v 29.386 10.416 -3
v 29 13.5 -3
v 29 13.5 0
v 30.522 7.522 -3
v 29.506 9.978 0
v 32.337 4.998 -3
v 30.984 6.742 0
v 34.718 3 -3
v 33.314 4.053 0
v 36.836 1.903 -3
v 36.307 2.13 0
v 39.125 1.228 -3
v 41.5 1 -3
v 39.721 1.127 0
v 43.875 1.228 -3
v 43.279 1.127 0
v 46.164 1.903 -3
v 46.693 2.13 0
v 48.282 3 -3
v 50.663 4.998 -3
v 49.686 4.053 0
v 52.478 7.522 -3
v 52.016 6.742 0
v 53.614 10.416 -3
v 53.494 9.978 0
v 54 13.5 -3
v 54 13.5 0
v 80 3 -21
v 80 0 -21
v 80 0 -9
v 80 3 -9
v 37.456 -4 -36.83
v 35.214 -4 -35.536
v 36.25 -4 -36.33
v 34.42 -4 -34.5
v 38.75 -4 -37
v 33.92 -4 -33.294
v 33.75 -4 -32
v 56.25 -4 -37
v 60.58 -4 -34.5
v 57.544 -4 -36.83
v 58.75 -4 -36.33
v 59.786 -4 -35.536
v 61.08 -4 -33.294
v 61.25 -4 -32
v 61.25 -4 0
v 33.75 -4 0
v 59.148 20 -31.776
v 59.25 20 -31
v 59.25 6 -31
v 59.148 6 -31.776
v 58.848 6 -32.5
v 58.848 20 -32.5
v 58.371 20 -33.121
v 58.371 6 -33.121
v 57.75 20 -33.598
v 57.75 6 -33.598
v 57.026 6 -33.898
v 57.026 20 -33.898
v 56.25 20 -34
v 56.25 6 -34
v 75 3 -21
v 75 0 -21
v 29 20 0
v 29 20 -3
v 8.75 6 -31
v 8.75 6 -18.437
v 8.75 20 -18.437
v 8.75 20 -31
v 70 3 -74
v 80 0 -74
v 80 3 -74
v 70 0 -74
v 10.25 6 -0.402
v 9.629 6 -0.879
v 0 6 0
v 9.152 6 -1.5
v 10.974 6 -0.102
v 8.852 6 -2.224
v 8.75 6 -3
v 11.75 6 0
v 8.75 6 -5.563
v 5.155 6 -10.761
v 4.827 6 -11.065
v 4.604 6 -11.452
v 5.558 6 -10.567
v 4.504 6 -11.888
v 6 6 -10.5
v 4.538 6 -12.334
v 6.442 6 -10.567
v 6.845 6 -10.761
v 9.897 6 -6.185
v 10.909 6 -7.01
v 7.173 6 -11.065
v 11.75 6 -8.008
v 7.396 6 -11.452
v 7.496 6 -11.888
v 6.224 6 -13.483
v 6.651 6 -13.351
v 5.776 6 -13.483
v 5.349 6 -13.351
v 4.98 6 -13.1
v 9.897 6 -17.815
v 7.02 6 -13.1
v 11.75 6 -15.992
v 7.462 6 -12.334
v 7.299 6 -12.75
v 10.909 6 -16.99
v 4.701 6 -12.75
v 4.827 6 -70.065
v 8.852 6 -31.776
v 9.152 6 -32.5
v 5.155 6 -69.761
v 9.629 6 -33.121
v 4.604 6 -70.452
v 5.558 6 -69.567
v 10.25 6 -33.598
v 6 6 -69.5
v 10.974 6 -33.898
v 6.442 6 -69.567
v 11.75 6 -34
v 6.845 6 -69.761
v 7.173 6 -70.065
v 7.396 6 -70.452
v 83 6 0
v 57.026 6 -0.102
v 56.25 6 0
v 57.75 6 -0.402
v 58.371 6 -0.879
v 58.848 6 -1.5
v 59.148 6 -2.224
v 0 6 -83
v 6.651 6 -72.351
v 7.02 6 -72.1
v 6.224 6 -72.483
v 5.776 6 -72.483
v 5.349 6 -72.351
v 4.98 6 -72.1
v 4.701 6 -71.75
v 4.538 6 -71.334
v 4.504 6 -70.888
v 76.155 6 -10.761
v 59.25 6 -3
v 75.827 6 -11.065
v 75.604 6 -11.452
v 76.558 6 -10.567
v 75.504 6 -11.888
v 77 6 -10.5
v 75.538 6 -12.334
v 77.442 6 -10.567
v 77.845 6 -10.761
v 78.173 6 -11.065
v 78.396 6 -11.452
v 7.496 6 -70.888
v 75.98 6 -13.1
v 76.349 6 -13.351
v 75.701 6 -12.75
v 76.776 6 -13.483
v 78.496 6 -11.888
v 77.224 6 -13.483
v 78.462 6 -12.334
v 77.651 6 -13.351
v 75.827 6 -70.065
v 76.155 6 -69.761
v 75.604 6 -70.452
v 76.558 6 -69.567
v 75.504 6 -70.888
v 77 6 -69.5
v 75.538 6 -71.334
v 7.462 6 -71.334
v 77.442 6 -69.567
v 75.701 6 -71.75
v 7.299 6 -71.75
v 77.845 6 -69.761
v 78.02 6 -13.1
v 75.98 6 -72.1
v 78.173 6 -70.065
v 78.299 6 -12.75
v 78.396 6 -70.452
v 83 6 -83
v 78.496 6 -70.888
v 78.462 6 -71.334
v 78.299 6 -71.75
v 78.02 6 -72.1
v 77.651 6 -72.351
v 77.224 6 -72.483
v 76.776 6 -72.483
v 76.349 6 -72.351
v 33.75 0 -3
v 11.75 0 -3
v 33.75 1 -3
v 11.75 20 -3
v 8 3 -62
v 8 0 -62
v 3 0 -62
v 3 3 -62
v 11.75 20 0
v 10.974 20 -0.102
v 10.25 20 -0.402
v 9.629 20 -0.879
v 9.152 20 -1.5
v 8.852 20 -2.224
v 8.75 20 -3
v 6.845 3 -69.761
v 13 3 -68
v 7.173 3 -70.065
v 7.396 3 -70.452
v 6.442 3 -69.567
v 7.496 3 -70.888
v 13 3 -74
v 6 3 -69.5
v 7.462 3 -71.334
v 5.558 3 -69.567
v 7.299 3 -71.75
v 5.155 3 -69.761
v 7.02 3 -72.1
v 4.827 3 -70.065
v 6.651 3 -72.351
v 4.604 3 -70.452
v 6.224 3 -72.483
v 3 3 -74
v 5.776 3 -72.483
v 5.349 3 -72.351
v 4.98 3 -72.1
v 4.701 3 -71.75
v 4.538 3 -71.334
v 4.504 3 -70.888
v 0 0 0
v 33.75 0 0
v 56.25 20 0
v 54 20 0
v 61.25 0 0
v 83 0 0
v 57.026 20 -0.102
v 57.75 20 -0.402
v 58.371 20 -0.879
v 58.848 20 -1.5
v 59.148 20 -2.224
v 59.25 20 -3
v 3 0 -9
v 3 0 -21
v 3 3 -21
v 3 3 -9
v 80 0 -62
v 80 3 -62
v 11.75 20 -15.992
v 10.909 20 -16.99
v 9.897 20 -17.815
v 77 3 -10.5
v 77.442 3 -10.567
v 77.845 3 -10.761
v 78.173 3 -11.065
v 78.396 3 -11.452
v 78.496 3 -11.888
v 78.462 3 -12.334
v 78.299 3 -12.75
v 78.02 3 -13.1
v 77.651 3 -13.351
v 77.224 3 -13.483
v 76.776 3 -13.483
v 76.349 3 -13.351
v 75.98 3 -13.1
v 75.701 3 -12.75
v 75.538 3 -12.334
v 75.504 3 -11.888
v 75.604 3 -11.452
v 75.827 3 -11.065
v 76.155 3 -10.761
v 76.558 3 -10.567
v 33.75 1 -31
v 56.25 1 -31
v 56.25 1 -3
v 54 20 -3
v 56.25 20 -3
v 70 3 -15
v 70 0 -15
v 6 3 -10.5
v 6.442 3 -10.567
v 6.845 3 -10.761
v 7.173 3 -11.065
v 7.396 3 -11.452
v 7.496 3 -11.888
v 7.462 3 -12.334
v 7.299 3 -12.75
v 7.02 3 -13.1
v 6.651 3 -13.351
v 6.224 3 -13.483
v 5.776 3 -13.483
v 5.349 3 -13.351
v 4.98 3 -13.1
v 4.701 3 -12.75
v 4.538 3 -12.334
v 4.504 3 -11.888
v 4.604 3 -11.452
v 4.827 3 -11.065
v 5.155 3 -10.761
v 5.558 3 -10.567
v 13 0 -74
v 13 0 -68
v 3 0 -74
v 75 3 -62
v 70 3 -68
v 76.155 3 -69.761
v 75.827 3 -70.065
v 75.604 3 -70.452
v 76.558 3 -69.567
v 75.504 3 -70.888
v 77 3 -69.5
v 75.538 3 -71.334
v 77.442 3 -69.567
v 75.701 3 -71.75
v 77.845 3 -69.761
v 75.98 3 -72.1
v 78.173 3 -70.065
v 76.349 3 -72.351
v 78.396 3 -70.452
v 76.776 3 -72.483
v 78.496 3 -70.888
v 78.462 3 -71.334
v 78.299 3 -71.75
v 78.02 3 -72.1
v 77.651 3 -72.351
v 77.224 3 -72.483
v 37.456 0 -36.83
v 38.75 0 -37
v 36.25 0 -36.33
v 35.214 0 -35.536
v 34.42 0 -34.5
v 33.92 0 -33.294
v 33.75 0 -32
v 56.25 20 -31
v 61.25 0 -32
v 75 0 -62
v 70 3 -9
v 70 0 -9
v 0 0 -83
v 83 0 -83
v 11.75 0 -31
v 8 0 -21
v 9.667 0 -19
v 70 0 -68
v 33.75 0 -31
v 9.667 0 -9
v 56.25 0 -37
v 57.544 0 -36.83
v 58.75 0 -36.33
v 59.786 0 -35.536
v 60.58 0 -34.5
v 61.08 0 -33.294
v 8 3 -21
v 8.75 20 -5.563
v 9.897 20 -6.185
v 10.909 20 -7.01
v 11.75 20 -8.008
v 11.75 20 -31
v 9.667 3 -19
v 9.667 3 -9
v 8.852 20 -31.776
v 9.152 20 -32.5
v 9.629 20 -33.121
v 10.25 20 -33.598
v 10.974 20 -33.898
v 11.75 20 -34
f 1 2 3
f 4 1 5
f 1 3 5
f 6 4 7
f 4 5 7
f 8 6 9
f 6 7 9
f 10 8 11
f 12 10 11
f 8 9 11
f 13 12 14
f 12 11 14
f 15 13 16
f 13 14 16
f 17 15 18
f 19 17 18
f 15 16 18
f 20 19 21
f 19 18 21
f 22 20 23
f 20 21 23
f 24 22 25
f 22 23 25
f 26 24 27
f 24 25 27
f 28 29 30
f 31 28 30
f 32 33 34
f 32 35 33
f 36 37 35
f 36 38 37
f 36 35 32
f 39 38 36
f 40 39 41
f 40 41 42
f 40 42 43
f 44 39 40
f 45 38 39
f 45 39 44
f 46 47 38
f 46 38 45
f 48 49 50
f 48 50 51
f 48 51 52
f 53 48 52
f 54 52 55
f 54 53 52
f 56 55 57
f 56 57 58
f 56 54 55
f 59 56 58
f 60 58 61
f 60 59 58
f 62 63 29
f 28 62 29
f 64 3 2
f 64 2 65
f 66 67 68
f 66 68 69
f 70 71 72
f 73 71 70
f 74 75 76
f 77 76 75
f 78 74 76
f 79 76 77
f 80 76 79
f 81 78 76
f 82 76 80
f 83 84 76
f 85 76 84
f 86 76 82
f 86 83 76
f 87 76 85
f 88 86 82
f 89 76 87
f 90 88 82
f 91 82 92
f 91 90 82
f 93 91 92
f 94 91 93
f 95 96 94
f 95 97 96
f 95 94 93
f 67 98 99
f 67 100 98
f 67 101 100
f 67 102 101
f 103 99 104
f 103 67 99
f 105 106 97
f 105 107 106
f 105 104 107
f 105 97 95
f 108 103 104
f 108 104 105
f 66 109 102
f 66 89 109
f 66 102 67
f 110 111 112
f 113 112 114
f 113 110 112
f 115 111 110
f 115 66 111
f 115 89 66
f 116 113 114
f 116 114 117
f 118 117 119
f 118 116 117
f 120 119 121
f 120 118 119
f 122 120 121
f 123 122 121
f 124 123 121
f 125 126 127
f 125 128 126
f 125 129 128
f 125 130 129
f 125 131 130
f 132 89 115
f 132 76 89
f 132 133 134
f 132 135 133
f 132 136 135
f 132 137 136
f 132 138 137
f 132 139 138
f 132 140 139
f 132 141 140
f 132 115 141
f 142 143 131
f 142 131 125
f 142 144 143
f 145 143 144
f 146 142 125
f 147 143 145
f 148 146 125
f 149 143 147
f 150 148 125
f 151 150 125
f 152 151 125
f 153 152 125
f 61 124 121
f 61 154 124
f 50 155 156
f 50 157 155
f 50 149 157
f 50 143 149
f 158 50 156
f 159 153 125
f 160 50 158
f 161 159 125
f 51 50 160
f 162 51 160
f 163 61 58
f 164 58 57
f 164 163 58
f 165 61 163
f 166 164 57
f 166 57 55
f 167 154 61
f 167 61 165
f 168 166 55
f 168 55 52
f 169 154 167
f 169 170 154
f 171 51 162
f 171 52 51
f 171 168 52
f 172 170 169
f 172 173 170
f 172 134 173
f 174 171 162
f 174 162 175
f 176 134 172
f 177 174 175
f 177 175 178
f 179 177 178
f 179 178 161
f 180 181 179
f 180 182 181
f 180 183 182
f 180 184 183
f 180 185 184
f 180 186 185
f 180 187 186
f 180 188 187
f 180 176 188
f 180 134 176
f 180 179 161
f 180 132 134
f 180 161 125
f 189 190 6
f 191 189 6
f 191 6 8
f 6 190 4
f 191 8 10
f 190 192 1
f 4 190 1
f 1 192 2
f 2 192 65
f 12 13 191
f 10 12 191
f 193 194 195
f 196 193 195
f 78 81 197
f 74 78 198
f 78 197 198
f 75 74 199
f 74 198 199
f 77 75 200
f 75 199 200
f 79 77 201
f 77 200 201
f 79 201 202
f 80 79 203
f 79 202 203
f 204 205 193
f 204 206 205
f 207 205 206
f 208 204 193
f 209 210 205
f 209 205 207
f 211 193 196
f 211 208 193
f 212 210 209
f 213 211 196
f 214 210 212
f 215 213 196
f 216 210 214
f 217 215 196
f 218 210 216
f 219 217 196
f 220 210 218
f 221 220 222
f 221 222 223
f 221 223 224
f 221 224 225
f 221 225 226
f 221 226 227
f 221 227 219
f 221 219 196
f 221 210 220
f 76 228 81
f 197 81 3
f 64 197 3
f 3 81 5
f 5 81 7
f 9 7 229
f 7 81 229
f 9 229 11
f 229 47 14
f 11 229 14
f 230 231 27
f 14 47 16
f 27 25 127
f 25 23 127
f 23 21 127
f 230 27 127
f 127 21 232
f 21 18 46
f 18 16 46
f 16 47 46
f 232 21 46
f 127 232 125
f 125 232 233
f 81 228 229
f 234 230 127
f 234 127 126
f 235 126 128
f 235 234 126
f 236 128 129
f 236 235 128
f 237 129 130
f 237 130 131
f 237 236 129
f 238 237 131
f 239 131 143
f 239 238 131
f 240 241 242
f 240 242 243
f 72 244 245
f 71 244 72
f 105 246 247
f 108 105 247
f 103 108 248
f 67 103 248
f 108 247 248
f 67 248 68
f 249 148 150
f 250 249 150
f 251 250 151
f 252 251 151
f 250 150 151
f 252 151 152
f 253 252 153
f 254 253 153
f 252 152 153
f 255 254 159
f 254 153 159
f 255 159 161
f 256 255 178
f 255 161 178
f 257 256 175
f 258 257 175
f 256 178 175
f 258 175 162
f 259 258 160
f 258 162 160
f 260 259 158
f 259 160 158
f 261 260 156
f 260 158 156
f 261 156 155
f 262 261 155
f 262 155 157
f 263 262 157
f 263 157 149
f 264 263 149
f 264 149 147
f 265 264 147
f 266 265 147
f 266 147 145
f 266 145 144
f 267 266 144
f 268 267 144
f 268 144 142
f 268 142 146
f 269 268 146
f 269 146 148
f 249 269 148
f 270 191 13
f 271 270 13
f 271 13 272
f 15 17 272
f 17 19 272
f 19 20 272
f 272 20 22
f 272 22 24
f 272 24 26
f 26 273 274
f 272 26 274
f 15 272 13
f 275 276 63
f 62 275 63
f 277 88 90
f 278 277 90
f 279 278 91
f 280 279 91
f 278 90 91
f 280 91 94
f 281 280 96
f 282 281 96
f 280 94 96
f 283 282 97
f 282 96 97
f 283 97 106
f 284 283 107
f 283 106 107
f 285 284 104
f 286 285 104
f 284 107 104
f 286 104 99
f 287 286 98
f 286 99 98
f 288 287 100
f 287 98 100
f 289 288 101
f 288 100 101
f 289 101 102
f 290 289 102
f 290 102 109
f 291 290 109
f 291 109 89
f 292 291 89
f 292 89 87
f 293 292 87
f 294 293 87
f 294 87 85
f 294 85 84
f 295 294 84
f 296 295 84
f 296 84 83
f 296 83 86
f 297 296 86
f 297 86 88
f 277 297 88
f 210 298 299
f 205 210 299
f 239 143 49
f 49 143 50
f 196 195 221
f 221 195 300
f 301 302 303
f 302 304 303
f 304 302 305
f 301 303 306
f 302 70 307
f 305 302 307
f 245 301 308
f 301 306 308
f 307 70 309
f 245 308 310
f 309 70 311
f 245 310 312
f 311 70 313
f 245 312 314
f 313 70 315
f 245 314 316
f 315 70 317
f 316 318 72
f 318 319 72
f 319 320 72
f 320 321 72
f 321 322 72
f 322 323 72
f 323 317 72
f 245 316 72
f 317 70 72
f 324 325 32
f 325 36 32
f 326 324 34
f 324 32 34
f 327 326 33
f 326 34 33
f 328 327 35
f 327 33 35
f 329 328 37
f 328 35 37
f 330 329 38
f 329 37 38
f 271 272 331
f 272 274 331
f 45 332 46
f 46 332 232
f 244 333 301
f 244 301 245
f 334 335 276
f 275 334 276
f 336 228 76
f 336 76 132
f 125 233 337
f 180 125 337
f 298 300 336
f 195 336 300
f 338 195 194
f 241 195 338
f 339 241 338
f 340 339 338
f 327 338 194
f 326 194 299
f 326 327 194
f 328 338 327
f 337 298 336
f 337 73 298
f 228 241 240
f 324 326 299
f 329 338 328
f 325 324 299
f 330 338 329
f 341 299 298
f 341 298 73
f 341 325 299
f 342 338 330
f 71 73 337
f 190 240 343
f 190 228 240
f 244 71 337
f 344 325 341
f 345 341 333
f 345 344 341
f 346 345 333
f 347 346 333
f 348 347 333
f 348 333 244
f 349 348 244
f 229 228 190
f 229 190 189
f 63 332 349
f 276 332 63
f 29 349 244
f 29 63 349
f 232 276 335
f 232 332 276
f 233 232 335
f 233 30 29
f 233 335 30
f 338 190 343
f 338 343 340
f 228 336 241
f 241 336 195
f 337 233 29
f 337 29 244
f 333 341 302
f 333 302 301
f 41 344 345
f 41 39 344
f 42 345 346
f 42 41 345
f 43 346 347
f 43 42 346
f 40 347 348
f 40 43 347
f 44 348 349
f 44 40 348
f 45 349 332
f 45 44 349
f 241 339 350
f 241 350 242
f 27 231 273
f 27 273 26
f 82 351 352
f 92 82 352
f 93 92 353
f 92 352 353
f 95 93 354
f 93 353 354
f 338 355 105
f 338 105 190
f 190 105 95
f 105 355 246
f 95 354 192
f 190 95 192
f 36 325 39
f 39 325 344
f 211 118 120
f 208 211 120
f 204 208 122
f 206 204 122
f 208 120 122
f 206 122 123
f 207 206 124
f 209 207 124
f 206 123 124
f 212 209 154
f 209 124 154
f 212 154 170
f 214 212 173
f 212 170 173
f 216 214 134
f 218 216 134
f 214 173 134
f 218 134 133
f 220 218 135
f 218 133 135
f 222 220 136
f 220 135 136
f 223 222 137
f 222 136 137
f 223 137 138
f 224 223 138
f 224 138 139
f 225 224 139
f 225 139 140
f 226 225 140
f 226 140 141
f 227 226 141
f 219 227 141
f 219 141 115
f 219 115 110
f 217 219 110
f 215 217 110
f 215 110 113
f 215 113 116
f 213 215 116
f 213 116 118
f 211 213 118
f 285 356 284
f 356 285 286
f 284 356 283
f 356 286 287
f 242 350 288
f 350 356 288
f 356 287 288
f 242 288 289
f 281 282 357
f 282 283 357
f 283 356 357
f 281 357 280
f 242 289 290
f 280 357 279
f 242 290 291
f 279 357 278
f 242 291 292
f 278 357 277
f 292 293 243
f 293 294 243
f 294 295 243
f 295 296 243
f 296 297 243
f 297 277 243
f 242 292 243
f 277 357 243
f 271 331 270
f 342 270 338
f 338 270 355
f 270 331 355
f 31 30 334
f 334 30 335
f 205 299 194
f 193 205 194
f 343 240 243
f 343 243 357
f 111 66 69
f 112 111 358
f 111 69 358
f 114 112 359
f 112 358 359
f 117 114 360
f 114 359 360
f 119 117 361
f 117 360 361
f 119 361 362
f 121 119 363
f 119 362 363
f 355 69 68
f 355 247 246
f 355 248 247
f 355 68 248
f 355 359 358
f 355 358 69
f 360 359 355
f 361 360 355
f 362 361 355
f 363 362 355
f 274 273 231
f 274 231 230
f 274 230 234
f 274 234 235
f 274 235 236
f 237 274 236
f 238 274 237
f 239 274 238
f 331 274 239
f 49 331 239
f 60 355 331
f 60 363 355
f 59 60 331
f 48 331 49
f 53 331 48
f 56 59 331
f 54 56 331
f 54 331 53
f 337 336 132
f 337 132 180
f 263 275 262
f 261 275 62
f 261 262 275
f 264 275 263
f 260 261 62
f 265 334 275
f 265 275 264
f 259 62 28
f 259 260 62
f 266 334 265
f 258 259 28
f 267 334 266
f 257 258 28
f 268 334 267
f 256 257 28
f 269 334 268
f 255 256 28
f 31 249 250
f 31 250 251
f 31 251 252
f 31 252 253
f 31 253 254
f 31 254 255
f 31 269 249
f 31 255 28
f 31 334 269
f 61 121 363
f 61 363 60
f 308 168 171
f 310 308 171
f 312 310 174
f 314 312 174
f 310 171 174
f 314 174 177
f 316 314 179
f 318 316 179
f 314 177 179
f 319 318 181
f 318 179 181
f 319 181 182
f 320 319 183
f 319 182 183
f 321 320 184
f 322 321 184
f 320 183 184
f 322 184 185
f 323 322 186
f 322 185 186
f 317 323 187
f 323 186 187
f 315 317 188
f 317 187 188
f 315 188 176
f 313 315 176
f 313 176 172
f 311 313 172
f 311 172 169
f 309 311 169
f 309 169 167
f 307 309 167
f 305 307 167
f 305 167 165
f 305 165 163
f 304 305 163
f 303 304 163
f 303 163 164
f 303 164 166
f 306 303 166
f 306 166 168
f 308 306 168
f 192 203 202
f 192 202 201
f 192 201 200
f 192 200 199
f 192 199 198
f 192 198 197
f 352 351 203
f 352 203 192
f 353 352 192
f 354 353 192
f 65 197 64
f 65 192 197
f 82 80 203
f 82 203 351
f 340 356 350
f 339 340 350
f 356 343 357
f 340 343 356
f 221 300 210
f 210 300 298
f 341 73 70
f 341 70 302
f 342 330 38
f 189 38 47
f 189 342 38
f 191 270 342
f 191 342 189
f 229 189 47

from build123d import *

# Parameters (mm, degrees)
SKETCH1_W                                = 83
SKETCH1_H                                = 83
BOSS_EXTRUDE1_DEPTH                      = 6
SKETCH2_R                                = 1.5
CUT_EXTRUDE1_DEPTH                       = 118.532974097
SKETCH5_W                                = 50.5
SKETCH5_H                                = 34
BOSS_EXTRUDE2_DEPTH                      = 22
SKETCH6_W                                = 44.5
SKETCH6_H                                = 28
CUT_EXTRUDE5_DEPTH                       = 25
FILLET1_R                                = 3
SKETCH8_R                                = 12.5
CUT_EXTRUDE6_DEPTH                       = 10
CUT_EXTRUDE7_DEPTH                       = 121.673112167
CUT_EXTRUDE7_DEPTH_BACK                  = 121.673112167
SKETCH9_W                                = 83
SKETCH9_H                                = 8
CUT_EXTRUDE8_DEPTH                       = 3
MIRROR1_AT_THE_SECOND_PLANE_COPY_1_DEPTH = 3
CUT_EXTRUDE9_DEPTH                       = 14
CUT_EXTRUDE10_DEPTH                      = 10
CUT_EXTRUDE11_DEPTH                      = 10
BOSS_EXTRUDE3_DEPTH                      = 3
CUT_EXTRUDE14_DEPTH                      = 4
SKETCH20_W                               = 13.564659966
SKETCH20_H                               = 7
CUT_EXTRUDE15_DEPTH                      = 4
BOSS_EXTRUDE4_DEPTH                      = 4
BOSS_EXTRUDE4_DEPTH_BACK                 = 1
SKETCH21_W                               = 27.5
SKETCH21_H                               = 37
FILLET2_R                                = 5


with BuildPart() as part:
    # Sketch1 → Boss-Extrude1 (new body)
    with BuildSketch(Plane(origin=(0, 0, 0), x_dir=(1, 0, 0), z_dir=(0, 1, 0))):
        with Locations((41.5, 41.5)):
            Rectangle(SKETCH1_W, SKETCH1_H)
    extrude(amount=BOSS_EXTRUDE1_DEPTH)

    # Sketch2 → Cut-Extrude1 (cut, through all)
    with BuildSketch(Plane(origin=(0, 6, 0), x_dir=(1, 0, 0), z_dir=(0, 1, 0))):
        with Locations(Location((6, 71, 0), (0, 0, 270))):
            Circle(SKETCH2_R)
        with Locations(Location((6, 12, 0), (0, 0, 270))):
            Circle(SKETCH2_R)
        with Locations(Location((77, 12, 0), (0, 0, 270))):
            Circle(SKETCH2_R)
        with Locations(Location((77, 71, 0), (0, 0, 270))):
            Circle(SKETCH2_R)
    extrude(amount=-CUT_EXTRUDE1_DEPTH, mode=Mode.SUBTRACT)

    # Sketch5 → Boss-Extrude2 (add)
    with BuildSketch(Plane(origin=(0, 6, 0), x_dir=(1, 0, 0), z_dir=(0, 1, 0))):
        with Locations((34, 17)):
            Rectangle(SKETCH5_W, SKETCH5_H)
    extrude(amount=BOSS_EXTRUDE2_DEPTH)

    # Sketch6 → Cut-Extrude5 (cut)
    with BuildSketch(Plane(origin=(0, 28, 0), x_dir=(1, 0, 0), z_dir=(0, 1, 0))):
        with Locations((34, 17)):
            Rectangle(SKETCH6_W, SKETCH6_H)
    extrude(amount=-CUT_EXTRUDE5_DEPTH, mode=Mode.SUBTRACT)

    # Fillet1
    fillet1_edges = [part.edges().sort_by_distance(p)[0] for p in [
        (59.25, 17, -34),
        (8.75, 17, -34),
        (8.75, 17, 0),
        (59.25, 17, 0),
    ]]
    fillet(fillet1_edges, radius=FILLET1_R)

    # Sketch8 → Cut-Extrude6 (cut)
    with BuildSketch(Plane.XY):
        with Locations((41.5, 13.5)):
            Circle(SKETCH8_R)
    extrude(amount=-CUT_EXTRUDE6_DEPTH, mode=Mode.SUBTRACT)

    # Sketch9 → Cut-Extrude7 (cut, two sides: drawn at the far end of the back side and taken through both)
    with BuildSketch(Plane.XY.offset(-CUT_EXTRUDE7_DEPTH_BACK)):
        with Locations((41.5, 24)):
            Rectangle(SKETCH9_W, SKETCH9_H)
    extrude(amount=CUT_EXTRUDE7_DEPTH + CUT_EXTRUDE7_DEPTH_BACK, mode=Mode.SUBTRACT)

    # Sketch11 → Cut-Extrude8 (cut)
    with BuildSketch(Plane.XZ):
        Polygon((3, -9), (13, -9), (13, -15), (8, -21), (3, -21), align=None)
    cut_extrude8 = extrude(amount=-CUT_EXTRUDE8_DEPTH, mode=Mode.SUBTRACT)

    # Mirror1: Cut-Extrude8 across plane
    add(cut_extrude8.mirror(Plane.XY.offset(-41.5)), mode=Mode.SUBTRACT)

    # Mirror1 at the second plane: Cut-Extrude8 across plane
    add(cut_extrude8.mirror(Plane.ZY.offset(-41.5)), mode=Mode.SUBTRACT)

    # Mirror1 at the second plane copy 1 sketc → Mirror1 at the second plane copy 1 (cut)
    with BuildSketch(Plane(origin=(83, 0, -83), x_dir=(-1, 0, 0), z_dir=(0, -1, 0))):
        Polygon((3, -9), (13, -9), (13, -15), (8, -21), (3, -21), align=None)
    extrude(amount=-MIRROR1_AT_THE_SECOND_PLANE_COPY_1_DEPTH, mode=Mode.SUBTRACT)

    # Sketch13 → Cut-Extrude9 (cut)
    with BuildSketch(Plane(origin=(0, 20, 0), x_dir=(1, 0, 0), z_dir=(0, 1, 0))):
        with BuildLine():
            Line((11.75, 8.007820144), (11.75, 15.992179856))
            ThreePointArc((11.75, 15.992179856), (10.422332723, 17.426137972), (8.75, 18.437196595))
            Line((8.75, 18.437196595), (8.75, 5.562803405))
            ThreePointArc((8.75, 5.562803405), (10.422332723, 6.573862028), (11.75, 8.007820144))
        make_face()
    extrude(amount=-CUT_EXTRUDE9_DEPTH, mode=Mode.SUBTRACT)

    # Sketch14 → Cut-Extrude10 (cut)
    with BuildSketch(Plane.XY):
        Polygon((29, 13.5), (29, 20), (30.822921748, 20), align=None)
    extrude(amount=-CUT_EXTRUDE10_DEPTH, mode=Mode.SUBTRACT)

    # Sketch15 → Cut-Extrude11 (cut)
    with BuildSketch(Plane.XY):
        Polygon((54, 20), (54, 13.5), (52.177078252, 20), align=None)
    extrude(amount=-CUT_EXTRUDE11_DEPTH, mode=Mode.SUBTRACT)

    # Sketch17 → Boss-Extrude3 (add)
    with BuildSketch(Plane.XZ):
        Polygon((9.666666667, -9), (9.666666667, -19), (13, -15), (13, -9), align=None)
    extrude(amount=-BOSS_EXTRUDE3_DEPTH)

    # Sketch18 → Cut-Extrude14 (cut)
    with BuildSketch(Plane(origin=(0, 3, 0), x_dir=(1, 0, 0), z_dir=(0, 1, 0))):
        Polygon((34.717670017, 3), (34.717670017, 10), (48.282329983, 10), (48.282329983, 3), (56.25, 3), (56.25, 31), (11.75, 31), (11.75, 3), align=None)
    extrude(amount=-CUT_EXTRUDE14_DEPTH, mode=Mode.SUBTRACT)

    # Sketch20 → Cut-Extrude15 (cut)
    with BuildSketch(Plane.XZ):
        with Locations((41.5, -6.5)):
            Rectangle(SKETCH20_W, SKETCH20_H)
    extrude(amount=-CUT_EXTRUDE15_DEPTH, mode=Mode.SUBTRACT)

    # Sketch21 → Boss-Extrude4 (add, two sides: drawn at the far end of the back side and taken through both)
    with BuildSketch(Plane.XZ.offset(-BOSS_EXTRUDE4_DEPTH_BACK)):
        with Locations((47.5, -18.5)):
            Rectangle(SKETCH21_W, SKETCH21_H)
    extrude(amount=BOSS_EXTRUDE4_DEPTH + BOSS_EXTRUDE4_DEPTH_BACK)

    # Fillet2
    fillet2_edges = [part.edges().sort_by_distance(p)[0] for p in [
        (33.75, -2, -37),
        (61.25, -2, -37),
    ]]
    fillet(fillet2_edges, radius=FILLET2_R)


solid = part.part
